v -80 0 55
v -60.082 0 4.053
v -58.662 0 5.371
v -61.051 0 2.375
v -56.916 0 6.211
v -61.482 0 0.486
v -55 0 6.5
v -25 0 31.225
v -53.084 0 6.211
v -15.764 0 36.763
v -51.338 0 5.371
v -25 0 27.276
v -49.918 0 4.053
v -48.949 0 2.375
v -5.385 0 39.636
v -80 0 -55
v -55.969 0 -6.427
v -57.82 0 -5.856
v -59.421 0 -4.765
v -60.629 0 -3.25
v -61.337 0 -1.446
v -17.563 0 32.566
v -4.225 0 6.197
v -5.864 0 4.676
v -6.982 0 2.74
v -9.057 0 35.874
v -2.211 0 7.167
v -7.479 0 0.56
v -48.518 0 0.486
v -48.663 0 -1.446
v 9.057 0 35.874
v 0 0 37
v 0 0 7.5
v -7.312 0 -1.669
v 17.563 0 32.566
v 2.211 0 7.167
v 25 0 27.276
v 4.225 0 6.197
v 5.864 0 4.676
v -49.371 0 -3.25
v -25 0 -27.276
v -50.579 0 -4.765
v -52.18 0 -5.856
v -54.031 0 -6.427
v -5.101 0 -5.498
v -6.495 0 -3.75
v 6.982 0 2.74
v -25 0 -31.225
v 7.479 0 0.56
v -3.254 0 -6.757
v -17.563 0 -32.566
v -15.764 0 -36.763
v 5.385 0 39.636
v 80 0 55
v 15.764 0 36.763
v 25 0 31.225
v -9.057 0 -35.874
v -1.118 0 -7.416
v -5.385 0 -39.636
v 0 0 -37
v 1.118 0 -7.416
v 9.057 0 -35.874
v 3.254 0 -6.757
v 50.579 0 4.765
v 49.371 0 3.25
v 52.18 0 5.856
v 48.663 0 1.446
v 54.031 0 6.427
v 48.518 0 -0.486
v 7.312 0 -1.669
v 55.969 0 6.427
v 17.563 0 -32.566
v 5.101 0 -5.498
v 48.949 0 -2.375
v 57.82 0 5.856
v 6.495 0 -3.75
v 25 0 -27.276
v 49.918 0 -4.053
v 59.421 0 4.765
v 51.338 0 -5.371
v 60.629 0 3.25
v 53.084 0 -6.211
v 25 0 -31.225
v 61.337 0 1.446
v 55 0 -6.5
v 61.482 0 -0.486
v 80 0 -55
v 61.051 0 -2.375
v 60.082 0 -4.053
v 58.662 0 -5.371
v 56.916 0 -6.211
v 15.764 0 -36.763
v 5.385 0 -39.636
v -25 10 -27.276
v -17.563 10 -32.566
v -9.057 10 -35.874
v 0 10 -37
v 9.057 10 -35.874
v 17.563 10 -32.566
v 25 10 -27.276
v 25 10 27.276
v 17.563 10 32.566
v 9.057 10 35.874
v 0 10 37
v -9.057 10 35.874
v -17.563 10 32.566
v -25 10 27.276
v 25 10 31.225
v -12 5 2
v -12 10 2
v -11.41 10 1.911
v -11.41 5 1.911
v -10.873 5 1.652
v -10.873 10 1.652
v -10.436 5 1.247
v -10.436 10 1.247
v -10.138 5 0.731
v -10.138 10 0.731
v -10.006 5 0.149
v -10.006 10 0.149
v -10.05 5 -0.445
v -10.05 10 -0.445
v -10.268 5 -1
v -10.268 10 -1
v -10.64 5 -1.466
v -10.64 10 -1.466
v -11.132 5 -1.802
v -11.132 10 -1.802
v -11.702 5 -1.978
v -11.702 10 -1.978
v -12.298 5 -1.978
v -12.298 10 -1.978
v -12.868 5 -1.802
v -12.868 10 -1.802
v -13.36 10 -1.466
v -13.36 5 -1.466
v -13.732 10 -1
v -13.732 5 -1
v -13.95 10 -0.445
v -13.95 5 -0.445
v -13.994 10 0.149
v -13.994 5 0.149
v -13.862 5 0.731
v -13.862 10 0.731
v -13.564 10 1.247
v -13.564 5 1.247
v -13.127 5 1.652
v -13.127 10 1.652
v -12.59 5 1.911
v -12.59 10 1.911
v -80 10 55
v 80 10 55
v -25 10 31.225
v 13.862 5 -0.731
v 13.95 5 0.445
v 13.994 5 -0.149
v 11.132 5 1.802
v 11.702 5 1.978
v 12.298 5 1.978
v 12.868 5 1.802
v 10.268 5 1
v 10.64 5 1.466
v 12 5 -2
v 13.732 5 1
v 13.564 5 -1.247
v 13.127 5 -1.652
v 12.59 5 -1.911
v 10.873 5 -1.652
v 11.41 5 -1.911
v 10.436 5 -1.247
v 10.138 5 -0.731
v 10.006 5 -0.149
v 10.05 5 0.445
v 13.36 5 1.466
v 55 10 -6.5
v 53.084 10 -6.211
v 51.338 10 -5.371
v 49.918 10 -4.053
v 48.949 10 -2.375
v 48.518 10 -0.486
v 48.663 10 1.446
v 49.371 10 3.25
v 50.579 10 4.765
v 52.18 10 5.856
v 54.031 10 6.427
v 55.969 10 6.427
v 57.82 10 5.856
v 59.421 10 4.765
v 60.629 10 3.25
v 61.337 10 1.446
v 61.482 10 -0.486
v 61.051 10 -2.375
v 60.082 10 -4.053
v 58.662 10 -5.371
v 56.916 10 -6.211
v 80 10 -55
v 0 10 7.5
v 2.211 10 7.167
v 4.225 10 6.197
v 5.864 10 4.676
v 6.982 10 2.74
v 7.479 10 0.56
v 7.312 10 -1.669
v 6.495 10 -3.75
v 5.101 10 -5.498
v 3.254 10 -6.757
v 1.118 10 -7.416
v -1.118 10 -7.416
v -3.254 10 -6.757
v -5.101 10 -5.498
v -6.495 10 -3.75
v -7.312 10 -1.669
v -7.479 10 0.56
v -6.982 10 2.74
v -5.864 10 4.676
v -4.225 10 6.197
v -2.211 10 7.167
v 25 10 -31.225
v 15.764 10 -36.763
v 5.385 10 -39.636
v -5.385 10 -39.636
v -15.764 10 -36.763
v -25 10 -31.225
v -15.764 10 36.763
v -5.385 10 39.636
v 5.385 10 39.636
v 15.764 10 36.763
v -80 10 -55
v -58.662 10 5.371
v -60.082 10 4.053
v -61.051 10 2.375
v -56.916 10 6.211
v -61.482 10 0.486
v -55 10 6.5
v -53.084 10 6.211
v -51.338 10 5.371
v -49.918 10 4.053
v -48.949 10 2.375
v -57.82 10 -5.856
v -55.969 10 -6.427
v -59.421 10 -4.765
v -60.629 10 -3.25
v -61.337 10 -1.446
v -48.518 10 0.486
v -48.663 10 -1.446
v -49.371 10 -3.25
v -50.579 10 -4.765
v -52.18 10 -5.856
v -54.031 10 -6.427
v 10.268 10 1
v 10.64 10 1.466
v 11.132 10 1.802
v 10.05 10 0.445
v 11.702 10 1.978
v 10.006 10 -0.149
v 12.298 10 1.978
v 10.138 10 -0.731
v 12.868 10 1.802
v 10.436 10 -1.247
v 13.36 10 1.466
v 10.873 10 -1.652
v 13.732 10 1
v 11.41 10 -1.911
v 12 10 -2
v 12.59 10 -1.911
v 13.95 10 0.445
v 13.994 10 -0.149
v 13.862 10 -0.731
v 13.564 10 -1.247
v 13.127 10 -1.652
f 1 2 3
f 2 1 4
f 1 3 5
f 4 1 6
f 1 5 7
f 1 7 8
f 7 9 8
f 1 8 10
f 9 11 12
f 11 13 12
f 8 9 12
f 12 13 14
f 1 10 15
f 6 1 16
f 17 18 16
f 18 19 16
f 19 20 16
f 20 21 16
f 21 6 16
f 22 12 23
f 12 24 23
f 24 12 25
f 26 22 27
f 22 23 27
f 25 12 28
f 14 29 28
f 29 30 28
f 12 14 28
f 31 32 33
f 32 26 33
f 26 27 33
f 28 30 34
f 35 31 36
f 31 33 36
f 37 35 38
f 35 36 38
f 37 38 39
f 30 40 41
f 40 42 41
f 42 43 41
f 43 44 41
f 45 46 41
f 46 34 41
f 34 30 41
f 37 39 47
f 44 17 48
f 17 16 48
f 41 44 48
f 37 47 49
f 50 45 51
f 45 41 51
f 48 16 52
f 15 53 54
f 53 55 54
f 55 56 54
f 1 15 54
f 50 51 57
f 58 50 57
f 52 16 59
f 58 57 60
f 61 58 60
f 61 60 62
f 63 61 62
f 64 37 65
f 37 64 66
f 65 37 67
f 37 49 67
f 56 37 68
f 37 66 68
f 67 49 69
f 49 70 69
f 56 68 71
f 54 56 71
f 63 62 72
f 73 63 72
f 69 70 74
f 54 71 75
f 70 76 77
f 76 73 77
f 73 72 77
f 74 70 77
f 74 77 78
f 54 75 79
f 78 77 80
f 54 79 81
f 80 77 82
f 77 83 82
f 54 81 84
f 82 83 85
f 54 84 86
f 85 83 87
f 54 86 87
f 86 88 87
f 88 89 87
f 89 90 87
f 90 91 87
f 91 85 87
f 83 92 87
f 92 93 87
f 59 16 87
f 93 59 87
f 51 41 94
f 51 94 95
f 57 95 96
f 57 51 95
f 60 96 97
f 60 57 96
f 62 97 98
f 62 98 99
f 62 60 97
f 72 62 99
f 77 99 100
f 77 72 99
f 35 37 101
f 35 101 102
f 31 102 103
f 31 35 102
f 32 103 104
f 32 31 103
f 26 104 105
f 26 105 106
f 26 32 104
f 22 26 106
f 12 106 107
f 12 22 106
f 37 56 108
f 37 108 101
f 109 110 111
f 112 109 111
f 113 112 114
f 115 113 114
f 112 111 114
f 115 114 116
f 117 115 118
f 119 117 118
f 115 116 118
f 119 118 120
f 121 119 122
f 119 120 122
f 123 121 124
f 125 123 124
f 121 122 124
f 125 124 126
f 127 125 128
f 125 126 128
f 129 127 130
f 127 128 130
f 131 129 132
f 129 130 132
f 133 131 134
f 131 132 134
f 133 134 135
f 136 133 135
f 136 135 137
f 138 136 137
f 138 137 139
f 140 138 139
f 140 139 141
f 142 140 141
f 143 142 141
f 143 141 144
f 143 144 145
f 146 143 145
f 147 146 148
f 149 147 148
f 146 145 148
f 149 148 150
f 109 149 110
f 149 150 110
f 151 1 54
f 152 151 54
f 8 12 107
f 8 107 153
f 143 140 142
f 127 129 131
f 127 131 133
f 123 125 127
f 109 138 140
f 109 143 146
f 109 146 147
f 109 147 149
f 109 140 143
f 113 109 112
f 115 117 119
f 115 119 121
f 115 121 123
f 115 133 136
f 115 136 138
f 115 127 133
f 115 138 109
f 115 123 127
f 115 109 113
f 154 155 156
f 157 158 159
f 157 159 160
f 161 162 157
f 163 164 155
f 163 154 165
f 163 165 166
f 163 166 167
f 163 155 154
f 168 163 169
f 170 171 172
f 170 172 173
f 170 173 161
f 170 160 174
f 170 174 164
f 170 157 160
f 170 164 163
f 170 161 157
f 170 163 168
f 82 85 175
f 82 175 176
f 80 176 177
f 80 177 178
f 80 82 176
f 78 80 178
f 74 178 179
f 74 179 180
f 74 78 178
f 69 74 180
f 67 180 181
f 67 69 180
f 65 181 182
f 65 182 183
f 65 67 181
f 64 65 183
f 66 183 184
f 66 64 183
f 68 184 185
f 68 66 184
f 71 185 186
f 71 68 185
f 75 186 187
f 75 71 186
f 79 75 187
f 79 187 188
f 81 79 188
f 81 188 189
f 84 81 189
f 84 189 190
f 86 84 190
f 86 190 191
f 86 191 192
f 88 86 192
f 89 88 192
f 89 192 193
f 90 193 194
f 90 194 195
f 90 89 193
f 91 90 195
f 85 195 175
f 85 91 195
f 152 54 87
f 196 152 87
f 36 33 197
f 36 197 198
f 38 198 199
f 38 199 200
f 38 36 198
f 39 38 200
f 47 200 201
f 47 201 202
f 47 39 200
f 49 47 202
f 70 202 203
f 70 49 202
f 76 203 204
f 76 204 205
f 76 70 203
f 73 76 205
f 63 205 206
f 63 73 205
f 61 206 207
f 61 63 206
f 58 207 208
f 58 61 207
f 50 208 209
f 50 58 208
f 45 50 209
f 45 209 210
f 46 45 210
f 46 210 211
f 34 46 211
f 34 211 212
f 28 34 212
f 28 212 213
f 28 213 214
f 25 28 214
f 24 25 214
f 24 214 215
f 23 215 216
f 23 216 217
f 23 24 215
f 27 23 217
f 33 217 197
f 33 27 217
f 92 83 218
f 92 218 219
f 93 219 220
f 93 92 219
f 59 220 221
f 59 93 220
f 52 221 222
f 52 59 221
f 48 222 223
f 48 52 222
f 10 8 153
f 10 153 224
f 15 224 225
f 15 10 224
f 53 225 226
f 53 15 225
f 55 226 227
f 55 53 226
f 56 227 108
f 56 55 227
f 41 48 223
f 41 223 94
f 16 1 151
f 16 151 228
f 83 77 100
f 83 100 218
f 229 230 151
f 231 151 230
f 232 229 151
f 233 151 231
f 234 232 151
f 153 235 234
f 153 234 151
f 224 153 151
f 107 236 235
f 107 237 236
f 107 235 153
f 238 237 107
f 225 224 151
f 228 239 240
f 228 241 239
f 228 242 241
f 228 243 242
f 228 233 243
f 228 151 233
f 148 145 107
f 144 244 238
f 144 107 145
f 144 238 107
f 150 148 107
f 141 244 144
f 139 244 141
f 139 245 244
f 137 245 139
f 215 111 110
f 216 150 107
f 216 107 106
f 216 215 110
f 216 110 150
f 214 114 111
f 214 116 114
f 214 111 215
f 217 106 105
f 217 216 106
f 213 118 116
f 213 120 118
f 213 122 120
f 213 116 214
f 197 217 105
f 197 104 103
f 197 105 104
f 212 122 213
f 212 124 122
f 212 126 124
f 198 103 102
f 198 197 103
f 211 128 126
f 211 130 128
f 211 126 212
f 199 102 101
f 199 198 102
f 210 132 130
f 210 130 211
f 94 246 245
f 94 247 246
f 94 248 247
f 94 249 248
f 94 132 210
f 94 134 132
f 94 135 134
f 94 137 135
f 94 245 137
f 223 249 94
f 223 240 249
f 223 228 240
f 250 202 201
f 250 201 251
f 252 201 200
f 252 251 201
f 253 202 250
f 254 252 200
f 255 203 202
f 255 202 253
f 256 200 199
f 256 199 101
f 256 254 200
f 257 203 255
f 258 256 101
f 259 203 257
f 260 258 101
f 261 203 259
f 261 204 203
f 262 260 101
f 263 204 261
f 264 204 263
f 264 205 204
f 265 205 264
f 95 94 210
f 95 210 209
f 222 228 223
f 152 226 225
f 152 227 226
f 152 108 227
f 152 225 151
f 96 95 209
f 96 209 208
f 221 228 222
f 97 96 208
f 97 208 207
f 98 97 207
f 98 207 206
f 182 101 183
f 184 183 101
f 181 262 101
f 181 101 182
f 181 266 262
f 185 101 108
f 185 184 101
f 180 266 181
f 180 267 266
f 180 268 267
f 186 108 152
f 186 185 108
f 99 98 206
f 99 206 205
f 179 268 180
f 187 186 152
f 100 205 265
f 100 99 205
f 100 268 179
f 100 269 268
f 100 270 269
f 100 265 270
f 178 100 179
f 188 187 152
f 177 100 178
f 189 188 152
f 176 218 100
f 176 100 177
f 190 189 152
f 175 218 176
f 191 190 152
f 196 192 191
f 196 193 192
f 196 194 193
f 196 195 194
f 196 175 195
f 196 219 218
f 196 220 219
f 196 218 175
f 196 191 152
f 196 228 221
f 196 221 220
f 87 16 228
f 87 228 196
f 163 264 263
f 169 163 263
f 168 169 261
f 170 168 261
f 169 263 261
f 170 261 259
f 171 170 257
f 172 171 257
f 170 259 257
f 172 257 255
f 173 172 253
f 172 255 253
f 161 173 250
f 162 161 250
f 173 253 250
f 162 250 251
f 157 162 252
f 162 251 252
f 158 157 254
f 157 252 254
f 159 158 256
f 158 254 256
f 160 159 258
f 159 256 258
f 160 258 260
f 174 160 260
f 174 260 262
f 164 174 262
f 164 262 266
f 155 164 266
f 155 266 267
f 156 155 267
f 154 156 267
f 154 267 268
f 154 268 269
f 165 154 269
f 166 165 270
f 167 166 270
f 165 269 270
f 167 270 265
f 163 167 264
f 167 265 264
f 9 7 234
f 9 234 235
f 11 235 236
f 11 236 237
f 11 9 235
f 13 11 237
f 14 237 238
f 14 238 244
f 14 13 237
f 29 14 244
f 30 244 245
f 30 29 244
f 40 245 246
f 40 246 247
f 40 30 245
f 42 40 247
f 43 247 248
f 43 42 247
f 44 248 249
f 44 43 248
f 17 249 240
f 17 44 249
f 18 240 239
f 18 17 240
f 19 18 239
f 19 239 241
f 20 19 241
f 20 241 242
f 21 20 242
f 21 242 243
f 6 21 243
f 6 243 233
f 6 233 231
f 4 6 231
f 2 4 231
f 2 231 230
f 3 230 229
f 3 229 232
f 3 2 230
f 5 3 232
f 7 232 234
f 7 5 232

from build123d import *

# Parameters (mm, degrees)
SKETCH1_W           = 160
SKETCH1_H           = 110
SKETCH1_R           = 6.5
SKETCH1_R_2         = 7.5
BOSS_EXTRUDE1_DEPTH = 10
SKETCH2_R           = 2
CUT_EXTRUDE1_DEPTH  = 5


with BuildPart() as part:
    # Sketch1 → Boss-Extrude1 (new body)
    with BuildSketch(Plane(origin=(0, 0, 0), x_dir=(1, 0, 0), z_dir=(0, 1, 0))):
        Rectangle(SKETCH1_W, SKETCH1_H)
        with Locations(Location((-55, 0, 0), (0, 0, 270))):
            Circle(SKETCH1_R, mode=Mode.SUBTRACT)
        with Locations(Location((55, 0, 0), (0, 0, 90))):
            Circle(SKETCH1_R, mode=Mode.SUBTRACT)
        with Locations(Location((0, 0, 0), (0, 0, 270))):
            Circle(SKETCH1_R_2, mode=Mode.SUBTRACT)
        with BuildLine():
            Line((-25, 31.224989992), (-25, 27.276363394))
            ThreePointArc((-25, 27.276363394), (0, 37), (25, 27.276363394))
            Line((25, 27.276363394), (25, 31.224989992))
            ThreePointArc((25, 31.224989992), (0, 40), (-25, 31.224989992))
        make_face(mode=Mode.SUBTRACT)
        with BuildLine():
            Line((-25, -27.276363394), (-25, -31.224989992))
            ThreePointArc((-25, -31.224989992), (0, -40), (25, -31.224989992))
            Line((25, -31.224989992), (25, -27.276363394))
            ThreePointArc((25, -27.276363394), (0, -37), (-25, -27.276363394))
        make_face(mode=Mode.SUBTRACT)
    extrude(amount=BOSS_EXTRUDE1_DEPTH)

    # Sketch2 → Cut-Extrude1 (cut)
    with BuildSketch(Plane(origin=(0, 10, 0), x_dir=(1, 0, 0), z_dir=(0, 1, 0))):
        with Locations(Location((-12, 0, 0), (0, 0, 270))):
            Circle(SKETCH2_R)
        with Locations(Location((12, 0, 0), (0, 0, 90))):
            Circle(SKETCH2_R)
    extrude(amount=-CUT_EXTRUDE1_DEPTH, mode=Mode.SUBTRACT)


solid = part.part
